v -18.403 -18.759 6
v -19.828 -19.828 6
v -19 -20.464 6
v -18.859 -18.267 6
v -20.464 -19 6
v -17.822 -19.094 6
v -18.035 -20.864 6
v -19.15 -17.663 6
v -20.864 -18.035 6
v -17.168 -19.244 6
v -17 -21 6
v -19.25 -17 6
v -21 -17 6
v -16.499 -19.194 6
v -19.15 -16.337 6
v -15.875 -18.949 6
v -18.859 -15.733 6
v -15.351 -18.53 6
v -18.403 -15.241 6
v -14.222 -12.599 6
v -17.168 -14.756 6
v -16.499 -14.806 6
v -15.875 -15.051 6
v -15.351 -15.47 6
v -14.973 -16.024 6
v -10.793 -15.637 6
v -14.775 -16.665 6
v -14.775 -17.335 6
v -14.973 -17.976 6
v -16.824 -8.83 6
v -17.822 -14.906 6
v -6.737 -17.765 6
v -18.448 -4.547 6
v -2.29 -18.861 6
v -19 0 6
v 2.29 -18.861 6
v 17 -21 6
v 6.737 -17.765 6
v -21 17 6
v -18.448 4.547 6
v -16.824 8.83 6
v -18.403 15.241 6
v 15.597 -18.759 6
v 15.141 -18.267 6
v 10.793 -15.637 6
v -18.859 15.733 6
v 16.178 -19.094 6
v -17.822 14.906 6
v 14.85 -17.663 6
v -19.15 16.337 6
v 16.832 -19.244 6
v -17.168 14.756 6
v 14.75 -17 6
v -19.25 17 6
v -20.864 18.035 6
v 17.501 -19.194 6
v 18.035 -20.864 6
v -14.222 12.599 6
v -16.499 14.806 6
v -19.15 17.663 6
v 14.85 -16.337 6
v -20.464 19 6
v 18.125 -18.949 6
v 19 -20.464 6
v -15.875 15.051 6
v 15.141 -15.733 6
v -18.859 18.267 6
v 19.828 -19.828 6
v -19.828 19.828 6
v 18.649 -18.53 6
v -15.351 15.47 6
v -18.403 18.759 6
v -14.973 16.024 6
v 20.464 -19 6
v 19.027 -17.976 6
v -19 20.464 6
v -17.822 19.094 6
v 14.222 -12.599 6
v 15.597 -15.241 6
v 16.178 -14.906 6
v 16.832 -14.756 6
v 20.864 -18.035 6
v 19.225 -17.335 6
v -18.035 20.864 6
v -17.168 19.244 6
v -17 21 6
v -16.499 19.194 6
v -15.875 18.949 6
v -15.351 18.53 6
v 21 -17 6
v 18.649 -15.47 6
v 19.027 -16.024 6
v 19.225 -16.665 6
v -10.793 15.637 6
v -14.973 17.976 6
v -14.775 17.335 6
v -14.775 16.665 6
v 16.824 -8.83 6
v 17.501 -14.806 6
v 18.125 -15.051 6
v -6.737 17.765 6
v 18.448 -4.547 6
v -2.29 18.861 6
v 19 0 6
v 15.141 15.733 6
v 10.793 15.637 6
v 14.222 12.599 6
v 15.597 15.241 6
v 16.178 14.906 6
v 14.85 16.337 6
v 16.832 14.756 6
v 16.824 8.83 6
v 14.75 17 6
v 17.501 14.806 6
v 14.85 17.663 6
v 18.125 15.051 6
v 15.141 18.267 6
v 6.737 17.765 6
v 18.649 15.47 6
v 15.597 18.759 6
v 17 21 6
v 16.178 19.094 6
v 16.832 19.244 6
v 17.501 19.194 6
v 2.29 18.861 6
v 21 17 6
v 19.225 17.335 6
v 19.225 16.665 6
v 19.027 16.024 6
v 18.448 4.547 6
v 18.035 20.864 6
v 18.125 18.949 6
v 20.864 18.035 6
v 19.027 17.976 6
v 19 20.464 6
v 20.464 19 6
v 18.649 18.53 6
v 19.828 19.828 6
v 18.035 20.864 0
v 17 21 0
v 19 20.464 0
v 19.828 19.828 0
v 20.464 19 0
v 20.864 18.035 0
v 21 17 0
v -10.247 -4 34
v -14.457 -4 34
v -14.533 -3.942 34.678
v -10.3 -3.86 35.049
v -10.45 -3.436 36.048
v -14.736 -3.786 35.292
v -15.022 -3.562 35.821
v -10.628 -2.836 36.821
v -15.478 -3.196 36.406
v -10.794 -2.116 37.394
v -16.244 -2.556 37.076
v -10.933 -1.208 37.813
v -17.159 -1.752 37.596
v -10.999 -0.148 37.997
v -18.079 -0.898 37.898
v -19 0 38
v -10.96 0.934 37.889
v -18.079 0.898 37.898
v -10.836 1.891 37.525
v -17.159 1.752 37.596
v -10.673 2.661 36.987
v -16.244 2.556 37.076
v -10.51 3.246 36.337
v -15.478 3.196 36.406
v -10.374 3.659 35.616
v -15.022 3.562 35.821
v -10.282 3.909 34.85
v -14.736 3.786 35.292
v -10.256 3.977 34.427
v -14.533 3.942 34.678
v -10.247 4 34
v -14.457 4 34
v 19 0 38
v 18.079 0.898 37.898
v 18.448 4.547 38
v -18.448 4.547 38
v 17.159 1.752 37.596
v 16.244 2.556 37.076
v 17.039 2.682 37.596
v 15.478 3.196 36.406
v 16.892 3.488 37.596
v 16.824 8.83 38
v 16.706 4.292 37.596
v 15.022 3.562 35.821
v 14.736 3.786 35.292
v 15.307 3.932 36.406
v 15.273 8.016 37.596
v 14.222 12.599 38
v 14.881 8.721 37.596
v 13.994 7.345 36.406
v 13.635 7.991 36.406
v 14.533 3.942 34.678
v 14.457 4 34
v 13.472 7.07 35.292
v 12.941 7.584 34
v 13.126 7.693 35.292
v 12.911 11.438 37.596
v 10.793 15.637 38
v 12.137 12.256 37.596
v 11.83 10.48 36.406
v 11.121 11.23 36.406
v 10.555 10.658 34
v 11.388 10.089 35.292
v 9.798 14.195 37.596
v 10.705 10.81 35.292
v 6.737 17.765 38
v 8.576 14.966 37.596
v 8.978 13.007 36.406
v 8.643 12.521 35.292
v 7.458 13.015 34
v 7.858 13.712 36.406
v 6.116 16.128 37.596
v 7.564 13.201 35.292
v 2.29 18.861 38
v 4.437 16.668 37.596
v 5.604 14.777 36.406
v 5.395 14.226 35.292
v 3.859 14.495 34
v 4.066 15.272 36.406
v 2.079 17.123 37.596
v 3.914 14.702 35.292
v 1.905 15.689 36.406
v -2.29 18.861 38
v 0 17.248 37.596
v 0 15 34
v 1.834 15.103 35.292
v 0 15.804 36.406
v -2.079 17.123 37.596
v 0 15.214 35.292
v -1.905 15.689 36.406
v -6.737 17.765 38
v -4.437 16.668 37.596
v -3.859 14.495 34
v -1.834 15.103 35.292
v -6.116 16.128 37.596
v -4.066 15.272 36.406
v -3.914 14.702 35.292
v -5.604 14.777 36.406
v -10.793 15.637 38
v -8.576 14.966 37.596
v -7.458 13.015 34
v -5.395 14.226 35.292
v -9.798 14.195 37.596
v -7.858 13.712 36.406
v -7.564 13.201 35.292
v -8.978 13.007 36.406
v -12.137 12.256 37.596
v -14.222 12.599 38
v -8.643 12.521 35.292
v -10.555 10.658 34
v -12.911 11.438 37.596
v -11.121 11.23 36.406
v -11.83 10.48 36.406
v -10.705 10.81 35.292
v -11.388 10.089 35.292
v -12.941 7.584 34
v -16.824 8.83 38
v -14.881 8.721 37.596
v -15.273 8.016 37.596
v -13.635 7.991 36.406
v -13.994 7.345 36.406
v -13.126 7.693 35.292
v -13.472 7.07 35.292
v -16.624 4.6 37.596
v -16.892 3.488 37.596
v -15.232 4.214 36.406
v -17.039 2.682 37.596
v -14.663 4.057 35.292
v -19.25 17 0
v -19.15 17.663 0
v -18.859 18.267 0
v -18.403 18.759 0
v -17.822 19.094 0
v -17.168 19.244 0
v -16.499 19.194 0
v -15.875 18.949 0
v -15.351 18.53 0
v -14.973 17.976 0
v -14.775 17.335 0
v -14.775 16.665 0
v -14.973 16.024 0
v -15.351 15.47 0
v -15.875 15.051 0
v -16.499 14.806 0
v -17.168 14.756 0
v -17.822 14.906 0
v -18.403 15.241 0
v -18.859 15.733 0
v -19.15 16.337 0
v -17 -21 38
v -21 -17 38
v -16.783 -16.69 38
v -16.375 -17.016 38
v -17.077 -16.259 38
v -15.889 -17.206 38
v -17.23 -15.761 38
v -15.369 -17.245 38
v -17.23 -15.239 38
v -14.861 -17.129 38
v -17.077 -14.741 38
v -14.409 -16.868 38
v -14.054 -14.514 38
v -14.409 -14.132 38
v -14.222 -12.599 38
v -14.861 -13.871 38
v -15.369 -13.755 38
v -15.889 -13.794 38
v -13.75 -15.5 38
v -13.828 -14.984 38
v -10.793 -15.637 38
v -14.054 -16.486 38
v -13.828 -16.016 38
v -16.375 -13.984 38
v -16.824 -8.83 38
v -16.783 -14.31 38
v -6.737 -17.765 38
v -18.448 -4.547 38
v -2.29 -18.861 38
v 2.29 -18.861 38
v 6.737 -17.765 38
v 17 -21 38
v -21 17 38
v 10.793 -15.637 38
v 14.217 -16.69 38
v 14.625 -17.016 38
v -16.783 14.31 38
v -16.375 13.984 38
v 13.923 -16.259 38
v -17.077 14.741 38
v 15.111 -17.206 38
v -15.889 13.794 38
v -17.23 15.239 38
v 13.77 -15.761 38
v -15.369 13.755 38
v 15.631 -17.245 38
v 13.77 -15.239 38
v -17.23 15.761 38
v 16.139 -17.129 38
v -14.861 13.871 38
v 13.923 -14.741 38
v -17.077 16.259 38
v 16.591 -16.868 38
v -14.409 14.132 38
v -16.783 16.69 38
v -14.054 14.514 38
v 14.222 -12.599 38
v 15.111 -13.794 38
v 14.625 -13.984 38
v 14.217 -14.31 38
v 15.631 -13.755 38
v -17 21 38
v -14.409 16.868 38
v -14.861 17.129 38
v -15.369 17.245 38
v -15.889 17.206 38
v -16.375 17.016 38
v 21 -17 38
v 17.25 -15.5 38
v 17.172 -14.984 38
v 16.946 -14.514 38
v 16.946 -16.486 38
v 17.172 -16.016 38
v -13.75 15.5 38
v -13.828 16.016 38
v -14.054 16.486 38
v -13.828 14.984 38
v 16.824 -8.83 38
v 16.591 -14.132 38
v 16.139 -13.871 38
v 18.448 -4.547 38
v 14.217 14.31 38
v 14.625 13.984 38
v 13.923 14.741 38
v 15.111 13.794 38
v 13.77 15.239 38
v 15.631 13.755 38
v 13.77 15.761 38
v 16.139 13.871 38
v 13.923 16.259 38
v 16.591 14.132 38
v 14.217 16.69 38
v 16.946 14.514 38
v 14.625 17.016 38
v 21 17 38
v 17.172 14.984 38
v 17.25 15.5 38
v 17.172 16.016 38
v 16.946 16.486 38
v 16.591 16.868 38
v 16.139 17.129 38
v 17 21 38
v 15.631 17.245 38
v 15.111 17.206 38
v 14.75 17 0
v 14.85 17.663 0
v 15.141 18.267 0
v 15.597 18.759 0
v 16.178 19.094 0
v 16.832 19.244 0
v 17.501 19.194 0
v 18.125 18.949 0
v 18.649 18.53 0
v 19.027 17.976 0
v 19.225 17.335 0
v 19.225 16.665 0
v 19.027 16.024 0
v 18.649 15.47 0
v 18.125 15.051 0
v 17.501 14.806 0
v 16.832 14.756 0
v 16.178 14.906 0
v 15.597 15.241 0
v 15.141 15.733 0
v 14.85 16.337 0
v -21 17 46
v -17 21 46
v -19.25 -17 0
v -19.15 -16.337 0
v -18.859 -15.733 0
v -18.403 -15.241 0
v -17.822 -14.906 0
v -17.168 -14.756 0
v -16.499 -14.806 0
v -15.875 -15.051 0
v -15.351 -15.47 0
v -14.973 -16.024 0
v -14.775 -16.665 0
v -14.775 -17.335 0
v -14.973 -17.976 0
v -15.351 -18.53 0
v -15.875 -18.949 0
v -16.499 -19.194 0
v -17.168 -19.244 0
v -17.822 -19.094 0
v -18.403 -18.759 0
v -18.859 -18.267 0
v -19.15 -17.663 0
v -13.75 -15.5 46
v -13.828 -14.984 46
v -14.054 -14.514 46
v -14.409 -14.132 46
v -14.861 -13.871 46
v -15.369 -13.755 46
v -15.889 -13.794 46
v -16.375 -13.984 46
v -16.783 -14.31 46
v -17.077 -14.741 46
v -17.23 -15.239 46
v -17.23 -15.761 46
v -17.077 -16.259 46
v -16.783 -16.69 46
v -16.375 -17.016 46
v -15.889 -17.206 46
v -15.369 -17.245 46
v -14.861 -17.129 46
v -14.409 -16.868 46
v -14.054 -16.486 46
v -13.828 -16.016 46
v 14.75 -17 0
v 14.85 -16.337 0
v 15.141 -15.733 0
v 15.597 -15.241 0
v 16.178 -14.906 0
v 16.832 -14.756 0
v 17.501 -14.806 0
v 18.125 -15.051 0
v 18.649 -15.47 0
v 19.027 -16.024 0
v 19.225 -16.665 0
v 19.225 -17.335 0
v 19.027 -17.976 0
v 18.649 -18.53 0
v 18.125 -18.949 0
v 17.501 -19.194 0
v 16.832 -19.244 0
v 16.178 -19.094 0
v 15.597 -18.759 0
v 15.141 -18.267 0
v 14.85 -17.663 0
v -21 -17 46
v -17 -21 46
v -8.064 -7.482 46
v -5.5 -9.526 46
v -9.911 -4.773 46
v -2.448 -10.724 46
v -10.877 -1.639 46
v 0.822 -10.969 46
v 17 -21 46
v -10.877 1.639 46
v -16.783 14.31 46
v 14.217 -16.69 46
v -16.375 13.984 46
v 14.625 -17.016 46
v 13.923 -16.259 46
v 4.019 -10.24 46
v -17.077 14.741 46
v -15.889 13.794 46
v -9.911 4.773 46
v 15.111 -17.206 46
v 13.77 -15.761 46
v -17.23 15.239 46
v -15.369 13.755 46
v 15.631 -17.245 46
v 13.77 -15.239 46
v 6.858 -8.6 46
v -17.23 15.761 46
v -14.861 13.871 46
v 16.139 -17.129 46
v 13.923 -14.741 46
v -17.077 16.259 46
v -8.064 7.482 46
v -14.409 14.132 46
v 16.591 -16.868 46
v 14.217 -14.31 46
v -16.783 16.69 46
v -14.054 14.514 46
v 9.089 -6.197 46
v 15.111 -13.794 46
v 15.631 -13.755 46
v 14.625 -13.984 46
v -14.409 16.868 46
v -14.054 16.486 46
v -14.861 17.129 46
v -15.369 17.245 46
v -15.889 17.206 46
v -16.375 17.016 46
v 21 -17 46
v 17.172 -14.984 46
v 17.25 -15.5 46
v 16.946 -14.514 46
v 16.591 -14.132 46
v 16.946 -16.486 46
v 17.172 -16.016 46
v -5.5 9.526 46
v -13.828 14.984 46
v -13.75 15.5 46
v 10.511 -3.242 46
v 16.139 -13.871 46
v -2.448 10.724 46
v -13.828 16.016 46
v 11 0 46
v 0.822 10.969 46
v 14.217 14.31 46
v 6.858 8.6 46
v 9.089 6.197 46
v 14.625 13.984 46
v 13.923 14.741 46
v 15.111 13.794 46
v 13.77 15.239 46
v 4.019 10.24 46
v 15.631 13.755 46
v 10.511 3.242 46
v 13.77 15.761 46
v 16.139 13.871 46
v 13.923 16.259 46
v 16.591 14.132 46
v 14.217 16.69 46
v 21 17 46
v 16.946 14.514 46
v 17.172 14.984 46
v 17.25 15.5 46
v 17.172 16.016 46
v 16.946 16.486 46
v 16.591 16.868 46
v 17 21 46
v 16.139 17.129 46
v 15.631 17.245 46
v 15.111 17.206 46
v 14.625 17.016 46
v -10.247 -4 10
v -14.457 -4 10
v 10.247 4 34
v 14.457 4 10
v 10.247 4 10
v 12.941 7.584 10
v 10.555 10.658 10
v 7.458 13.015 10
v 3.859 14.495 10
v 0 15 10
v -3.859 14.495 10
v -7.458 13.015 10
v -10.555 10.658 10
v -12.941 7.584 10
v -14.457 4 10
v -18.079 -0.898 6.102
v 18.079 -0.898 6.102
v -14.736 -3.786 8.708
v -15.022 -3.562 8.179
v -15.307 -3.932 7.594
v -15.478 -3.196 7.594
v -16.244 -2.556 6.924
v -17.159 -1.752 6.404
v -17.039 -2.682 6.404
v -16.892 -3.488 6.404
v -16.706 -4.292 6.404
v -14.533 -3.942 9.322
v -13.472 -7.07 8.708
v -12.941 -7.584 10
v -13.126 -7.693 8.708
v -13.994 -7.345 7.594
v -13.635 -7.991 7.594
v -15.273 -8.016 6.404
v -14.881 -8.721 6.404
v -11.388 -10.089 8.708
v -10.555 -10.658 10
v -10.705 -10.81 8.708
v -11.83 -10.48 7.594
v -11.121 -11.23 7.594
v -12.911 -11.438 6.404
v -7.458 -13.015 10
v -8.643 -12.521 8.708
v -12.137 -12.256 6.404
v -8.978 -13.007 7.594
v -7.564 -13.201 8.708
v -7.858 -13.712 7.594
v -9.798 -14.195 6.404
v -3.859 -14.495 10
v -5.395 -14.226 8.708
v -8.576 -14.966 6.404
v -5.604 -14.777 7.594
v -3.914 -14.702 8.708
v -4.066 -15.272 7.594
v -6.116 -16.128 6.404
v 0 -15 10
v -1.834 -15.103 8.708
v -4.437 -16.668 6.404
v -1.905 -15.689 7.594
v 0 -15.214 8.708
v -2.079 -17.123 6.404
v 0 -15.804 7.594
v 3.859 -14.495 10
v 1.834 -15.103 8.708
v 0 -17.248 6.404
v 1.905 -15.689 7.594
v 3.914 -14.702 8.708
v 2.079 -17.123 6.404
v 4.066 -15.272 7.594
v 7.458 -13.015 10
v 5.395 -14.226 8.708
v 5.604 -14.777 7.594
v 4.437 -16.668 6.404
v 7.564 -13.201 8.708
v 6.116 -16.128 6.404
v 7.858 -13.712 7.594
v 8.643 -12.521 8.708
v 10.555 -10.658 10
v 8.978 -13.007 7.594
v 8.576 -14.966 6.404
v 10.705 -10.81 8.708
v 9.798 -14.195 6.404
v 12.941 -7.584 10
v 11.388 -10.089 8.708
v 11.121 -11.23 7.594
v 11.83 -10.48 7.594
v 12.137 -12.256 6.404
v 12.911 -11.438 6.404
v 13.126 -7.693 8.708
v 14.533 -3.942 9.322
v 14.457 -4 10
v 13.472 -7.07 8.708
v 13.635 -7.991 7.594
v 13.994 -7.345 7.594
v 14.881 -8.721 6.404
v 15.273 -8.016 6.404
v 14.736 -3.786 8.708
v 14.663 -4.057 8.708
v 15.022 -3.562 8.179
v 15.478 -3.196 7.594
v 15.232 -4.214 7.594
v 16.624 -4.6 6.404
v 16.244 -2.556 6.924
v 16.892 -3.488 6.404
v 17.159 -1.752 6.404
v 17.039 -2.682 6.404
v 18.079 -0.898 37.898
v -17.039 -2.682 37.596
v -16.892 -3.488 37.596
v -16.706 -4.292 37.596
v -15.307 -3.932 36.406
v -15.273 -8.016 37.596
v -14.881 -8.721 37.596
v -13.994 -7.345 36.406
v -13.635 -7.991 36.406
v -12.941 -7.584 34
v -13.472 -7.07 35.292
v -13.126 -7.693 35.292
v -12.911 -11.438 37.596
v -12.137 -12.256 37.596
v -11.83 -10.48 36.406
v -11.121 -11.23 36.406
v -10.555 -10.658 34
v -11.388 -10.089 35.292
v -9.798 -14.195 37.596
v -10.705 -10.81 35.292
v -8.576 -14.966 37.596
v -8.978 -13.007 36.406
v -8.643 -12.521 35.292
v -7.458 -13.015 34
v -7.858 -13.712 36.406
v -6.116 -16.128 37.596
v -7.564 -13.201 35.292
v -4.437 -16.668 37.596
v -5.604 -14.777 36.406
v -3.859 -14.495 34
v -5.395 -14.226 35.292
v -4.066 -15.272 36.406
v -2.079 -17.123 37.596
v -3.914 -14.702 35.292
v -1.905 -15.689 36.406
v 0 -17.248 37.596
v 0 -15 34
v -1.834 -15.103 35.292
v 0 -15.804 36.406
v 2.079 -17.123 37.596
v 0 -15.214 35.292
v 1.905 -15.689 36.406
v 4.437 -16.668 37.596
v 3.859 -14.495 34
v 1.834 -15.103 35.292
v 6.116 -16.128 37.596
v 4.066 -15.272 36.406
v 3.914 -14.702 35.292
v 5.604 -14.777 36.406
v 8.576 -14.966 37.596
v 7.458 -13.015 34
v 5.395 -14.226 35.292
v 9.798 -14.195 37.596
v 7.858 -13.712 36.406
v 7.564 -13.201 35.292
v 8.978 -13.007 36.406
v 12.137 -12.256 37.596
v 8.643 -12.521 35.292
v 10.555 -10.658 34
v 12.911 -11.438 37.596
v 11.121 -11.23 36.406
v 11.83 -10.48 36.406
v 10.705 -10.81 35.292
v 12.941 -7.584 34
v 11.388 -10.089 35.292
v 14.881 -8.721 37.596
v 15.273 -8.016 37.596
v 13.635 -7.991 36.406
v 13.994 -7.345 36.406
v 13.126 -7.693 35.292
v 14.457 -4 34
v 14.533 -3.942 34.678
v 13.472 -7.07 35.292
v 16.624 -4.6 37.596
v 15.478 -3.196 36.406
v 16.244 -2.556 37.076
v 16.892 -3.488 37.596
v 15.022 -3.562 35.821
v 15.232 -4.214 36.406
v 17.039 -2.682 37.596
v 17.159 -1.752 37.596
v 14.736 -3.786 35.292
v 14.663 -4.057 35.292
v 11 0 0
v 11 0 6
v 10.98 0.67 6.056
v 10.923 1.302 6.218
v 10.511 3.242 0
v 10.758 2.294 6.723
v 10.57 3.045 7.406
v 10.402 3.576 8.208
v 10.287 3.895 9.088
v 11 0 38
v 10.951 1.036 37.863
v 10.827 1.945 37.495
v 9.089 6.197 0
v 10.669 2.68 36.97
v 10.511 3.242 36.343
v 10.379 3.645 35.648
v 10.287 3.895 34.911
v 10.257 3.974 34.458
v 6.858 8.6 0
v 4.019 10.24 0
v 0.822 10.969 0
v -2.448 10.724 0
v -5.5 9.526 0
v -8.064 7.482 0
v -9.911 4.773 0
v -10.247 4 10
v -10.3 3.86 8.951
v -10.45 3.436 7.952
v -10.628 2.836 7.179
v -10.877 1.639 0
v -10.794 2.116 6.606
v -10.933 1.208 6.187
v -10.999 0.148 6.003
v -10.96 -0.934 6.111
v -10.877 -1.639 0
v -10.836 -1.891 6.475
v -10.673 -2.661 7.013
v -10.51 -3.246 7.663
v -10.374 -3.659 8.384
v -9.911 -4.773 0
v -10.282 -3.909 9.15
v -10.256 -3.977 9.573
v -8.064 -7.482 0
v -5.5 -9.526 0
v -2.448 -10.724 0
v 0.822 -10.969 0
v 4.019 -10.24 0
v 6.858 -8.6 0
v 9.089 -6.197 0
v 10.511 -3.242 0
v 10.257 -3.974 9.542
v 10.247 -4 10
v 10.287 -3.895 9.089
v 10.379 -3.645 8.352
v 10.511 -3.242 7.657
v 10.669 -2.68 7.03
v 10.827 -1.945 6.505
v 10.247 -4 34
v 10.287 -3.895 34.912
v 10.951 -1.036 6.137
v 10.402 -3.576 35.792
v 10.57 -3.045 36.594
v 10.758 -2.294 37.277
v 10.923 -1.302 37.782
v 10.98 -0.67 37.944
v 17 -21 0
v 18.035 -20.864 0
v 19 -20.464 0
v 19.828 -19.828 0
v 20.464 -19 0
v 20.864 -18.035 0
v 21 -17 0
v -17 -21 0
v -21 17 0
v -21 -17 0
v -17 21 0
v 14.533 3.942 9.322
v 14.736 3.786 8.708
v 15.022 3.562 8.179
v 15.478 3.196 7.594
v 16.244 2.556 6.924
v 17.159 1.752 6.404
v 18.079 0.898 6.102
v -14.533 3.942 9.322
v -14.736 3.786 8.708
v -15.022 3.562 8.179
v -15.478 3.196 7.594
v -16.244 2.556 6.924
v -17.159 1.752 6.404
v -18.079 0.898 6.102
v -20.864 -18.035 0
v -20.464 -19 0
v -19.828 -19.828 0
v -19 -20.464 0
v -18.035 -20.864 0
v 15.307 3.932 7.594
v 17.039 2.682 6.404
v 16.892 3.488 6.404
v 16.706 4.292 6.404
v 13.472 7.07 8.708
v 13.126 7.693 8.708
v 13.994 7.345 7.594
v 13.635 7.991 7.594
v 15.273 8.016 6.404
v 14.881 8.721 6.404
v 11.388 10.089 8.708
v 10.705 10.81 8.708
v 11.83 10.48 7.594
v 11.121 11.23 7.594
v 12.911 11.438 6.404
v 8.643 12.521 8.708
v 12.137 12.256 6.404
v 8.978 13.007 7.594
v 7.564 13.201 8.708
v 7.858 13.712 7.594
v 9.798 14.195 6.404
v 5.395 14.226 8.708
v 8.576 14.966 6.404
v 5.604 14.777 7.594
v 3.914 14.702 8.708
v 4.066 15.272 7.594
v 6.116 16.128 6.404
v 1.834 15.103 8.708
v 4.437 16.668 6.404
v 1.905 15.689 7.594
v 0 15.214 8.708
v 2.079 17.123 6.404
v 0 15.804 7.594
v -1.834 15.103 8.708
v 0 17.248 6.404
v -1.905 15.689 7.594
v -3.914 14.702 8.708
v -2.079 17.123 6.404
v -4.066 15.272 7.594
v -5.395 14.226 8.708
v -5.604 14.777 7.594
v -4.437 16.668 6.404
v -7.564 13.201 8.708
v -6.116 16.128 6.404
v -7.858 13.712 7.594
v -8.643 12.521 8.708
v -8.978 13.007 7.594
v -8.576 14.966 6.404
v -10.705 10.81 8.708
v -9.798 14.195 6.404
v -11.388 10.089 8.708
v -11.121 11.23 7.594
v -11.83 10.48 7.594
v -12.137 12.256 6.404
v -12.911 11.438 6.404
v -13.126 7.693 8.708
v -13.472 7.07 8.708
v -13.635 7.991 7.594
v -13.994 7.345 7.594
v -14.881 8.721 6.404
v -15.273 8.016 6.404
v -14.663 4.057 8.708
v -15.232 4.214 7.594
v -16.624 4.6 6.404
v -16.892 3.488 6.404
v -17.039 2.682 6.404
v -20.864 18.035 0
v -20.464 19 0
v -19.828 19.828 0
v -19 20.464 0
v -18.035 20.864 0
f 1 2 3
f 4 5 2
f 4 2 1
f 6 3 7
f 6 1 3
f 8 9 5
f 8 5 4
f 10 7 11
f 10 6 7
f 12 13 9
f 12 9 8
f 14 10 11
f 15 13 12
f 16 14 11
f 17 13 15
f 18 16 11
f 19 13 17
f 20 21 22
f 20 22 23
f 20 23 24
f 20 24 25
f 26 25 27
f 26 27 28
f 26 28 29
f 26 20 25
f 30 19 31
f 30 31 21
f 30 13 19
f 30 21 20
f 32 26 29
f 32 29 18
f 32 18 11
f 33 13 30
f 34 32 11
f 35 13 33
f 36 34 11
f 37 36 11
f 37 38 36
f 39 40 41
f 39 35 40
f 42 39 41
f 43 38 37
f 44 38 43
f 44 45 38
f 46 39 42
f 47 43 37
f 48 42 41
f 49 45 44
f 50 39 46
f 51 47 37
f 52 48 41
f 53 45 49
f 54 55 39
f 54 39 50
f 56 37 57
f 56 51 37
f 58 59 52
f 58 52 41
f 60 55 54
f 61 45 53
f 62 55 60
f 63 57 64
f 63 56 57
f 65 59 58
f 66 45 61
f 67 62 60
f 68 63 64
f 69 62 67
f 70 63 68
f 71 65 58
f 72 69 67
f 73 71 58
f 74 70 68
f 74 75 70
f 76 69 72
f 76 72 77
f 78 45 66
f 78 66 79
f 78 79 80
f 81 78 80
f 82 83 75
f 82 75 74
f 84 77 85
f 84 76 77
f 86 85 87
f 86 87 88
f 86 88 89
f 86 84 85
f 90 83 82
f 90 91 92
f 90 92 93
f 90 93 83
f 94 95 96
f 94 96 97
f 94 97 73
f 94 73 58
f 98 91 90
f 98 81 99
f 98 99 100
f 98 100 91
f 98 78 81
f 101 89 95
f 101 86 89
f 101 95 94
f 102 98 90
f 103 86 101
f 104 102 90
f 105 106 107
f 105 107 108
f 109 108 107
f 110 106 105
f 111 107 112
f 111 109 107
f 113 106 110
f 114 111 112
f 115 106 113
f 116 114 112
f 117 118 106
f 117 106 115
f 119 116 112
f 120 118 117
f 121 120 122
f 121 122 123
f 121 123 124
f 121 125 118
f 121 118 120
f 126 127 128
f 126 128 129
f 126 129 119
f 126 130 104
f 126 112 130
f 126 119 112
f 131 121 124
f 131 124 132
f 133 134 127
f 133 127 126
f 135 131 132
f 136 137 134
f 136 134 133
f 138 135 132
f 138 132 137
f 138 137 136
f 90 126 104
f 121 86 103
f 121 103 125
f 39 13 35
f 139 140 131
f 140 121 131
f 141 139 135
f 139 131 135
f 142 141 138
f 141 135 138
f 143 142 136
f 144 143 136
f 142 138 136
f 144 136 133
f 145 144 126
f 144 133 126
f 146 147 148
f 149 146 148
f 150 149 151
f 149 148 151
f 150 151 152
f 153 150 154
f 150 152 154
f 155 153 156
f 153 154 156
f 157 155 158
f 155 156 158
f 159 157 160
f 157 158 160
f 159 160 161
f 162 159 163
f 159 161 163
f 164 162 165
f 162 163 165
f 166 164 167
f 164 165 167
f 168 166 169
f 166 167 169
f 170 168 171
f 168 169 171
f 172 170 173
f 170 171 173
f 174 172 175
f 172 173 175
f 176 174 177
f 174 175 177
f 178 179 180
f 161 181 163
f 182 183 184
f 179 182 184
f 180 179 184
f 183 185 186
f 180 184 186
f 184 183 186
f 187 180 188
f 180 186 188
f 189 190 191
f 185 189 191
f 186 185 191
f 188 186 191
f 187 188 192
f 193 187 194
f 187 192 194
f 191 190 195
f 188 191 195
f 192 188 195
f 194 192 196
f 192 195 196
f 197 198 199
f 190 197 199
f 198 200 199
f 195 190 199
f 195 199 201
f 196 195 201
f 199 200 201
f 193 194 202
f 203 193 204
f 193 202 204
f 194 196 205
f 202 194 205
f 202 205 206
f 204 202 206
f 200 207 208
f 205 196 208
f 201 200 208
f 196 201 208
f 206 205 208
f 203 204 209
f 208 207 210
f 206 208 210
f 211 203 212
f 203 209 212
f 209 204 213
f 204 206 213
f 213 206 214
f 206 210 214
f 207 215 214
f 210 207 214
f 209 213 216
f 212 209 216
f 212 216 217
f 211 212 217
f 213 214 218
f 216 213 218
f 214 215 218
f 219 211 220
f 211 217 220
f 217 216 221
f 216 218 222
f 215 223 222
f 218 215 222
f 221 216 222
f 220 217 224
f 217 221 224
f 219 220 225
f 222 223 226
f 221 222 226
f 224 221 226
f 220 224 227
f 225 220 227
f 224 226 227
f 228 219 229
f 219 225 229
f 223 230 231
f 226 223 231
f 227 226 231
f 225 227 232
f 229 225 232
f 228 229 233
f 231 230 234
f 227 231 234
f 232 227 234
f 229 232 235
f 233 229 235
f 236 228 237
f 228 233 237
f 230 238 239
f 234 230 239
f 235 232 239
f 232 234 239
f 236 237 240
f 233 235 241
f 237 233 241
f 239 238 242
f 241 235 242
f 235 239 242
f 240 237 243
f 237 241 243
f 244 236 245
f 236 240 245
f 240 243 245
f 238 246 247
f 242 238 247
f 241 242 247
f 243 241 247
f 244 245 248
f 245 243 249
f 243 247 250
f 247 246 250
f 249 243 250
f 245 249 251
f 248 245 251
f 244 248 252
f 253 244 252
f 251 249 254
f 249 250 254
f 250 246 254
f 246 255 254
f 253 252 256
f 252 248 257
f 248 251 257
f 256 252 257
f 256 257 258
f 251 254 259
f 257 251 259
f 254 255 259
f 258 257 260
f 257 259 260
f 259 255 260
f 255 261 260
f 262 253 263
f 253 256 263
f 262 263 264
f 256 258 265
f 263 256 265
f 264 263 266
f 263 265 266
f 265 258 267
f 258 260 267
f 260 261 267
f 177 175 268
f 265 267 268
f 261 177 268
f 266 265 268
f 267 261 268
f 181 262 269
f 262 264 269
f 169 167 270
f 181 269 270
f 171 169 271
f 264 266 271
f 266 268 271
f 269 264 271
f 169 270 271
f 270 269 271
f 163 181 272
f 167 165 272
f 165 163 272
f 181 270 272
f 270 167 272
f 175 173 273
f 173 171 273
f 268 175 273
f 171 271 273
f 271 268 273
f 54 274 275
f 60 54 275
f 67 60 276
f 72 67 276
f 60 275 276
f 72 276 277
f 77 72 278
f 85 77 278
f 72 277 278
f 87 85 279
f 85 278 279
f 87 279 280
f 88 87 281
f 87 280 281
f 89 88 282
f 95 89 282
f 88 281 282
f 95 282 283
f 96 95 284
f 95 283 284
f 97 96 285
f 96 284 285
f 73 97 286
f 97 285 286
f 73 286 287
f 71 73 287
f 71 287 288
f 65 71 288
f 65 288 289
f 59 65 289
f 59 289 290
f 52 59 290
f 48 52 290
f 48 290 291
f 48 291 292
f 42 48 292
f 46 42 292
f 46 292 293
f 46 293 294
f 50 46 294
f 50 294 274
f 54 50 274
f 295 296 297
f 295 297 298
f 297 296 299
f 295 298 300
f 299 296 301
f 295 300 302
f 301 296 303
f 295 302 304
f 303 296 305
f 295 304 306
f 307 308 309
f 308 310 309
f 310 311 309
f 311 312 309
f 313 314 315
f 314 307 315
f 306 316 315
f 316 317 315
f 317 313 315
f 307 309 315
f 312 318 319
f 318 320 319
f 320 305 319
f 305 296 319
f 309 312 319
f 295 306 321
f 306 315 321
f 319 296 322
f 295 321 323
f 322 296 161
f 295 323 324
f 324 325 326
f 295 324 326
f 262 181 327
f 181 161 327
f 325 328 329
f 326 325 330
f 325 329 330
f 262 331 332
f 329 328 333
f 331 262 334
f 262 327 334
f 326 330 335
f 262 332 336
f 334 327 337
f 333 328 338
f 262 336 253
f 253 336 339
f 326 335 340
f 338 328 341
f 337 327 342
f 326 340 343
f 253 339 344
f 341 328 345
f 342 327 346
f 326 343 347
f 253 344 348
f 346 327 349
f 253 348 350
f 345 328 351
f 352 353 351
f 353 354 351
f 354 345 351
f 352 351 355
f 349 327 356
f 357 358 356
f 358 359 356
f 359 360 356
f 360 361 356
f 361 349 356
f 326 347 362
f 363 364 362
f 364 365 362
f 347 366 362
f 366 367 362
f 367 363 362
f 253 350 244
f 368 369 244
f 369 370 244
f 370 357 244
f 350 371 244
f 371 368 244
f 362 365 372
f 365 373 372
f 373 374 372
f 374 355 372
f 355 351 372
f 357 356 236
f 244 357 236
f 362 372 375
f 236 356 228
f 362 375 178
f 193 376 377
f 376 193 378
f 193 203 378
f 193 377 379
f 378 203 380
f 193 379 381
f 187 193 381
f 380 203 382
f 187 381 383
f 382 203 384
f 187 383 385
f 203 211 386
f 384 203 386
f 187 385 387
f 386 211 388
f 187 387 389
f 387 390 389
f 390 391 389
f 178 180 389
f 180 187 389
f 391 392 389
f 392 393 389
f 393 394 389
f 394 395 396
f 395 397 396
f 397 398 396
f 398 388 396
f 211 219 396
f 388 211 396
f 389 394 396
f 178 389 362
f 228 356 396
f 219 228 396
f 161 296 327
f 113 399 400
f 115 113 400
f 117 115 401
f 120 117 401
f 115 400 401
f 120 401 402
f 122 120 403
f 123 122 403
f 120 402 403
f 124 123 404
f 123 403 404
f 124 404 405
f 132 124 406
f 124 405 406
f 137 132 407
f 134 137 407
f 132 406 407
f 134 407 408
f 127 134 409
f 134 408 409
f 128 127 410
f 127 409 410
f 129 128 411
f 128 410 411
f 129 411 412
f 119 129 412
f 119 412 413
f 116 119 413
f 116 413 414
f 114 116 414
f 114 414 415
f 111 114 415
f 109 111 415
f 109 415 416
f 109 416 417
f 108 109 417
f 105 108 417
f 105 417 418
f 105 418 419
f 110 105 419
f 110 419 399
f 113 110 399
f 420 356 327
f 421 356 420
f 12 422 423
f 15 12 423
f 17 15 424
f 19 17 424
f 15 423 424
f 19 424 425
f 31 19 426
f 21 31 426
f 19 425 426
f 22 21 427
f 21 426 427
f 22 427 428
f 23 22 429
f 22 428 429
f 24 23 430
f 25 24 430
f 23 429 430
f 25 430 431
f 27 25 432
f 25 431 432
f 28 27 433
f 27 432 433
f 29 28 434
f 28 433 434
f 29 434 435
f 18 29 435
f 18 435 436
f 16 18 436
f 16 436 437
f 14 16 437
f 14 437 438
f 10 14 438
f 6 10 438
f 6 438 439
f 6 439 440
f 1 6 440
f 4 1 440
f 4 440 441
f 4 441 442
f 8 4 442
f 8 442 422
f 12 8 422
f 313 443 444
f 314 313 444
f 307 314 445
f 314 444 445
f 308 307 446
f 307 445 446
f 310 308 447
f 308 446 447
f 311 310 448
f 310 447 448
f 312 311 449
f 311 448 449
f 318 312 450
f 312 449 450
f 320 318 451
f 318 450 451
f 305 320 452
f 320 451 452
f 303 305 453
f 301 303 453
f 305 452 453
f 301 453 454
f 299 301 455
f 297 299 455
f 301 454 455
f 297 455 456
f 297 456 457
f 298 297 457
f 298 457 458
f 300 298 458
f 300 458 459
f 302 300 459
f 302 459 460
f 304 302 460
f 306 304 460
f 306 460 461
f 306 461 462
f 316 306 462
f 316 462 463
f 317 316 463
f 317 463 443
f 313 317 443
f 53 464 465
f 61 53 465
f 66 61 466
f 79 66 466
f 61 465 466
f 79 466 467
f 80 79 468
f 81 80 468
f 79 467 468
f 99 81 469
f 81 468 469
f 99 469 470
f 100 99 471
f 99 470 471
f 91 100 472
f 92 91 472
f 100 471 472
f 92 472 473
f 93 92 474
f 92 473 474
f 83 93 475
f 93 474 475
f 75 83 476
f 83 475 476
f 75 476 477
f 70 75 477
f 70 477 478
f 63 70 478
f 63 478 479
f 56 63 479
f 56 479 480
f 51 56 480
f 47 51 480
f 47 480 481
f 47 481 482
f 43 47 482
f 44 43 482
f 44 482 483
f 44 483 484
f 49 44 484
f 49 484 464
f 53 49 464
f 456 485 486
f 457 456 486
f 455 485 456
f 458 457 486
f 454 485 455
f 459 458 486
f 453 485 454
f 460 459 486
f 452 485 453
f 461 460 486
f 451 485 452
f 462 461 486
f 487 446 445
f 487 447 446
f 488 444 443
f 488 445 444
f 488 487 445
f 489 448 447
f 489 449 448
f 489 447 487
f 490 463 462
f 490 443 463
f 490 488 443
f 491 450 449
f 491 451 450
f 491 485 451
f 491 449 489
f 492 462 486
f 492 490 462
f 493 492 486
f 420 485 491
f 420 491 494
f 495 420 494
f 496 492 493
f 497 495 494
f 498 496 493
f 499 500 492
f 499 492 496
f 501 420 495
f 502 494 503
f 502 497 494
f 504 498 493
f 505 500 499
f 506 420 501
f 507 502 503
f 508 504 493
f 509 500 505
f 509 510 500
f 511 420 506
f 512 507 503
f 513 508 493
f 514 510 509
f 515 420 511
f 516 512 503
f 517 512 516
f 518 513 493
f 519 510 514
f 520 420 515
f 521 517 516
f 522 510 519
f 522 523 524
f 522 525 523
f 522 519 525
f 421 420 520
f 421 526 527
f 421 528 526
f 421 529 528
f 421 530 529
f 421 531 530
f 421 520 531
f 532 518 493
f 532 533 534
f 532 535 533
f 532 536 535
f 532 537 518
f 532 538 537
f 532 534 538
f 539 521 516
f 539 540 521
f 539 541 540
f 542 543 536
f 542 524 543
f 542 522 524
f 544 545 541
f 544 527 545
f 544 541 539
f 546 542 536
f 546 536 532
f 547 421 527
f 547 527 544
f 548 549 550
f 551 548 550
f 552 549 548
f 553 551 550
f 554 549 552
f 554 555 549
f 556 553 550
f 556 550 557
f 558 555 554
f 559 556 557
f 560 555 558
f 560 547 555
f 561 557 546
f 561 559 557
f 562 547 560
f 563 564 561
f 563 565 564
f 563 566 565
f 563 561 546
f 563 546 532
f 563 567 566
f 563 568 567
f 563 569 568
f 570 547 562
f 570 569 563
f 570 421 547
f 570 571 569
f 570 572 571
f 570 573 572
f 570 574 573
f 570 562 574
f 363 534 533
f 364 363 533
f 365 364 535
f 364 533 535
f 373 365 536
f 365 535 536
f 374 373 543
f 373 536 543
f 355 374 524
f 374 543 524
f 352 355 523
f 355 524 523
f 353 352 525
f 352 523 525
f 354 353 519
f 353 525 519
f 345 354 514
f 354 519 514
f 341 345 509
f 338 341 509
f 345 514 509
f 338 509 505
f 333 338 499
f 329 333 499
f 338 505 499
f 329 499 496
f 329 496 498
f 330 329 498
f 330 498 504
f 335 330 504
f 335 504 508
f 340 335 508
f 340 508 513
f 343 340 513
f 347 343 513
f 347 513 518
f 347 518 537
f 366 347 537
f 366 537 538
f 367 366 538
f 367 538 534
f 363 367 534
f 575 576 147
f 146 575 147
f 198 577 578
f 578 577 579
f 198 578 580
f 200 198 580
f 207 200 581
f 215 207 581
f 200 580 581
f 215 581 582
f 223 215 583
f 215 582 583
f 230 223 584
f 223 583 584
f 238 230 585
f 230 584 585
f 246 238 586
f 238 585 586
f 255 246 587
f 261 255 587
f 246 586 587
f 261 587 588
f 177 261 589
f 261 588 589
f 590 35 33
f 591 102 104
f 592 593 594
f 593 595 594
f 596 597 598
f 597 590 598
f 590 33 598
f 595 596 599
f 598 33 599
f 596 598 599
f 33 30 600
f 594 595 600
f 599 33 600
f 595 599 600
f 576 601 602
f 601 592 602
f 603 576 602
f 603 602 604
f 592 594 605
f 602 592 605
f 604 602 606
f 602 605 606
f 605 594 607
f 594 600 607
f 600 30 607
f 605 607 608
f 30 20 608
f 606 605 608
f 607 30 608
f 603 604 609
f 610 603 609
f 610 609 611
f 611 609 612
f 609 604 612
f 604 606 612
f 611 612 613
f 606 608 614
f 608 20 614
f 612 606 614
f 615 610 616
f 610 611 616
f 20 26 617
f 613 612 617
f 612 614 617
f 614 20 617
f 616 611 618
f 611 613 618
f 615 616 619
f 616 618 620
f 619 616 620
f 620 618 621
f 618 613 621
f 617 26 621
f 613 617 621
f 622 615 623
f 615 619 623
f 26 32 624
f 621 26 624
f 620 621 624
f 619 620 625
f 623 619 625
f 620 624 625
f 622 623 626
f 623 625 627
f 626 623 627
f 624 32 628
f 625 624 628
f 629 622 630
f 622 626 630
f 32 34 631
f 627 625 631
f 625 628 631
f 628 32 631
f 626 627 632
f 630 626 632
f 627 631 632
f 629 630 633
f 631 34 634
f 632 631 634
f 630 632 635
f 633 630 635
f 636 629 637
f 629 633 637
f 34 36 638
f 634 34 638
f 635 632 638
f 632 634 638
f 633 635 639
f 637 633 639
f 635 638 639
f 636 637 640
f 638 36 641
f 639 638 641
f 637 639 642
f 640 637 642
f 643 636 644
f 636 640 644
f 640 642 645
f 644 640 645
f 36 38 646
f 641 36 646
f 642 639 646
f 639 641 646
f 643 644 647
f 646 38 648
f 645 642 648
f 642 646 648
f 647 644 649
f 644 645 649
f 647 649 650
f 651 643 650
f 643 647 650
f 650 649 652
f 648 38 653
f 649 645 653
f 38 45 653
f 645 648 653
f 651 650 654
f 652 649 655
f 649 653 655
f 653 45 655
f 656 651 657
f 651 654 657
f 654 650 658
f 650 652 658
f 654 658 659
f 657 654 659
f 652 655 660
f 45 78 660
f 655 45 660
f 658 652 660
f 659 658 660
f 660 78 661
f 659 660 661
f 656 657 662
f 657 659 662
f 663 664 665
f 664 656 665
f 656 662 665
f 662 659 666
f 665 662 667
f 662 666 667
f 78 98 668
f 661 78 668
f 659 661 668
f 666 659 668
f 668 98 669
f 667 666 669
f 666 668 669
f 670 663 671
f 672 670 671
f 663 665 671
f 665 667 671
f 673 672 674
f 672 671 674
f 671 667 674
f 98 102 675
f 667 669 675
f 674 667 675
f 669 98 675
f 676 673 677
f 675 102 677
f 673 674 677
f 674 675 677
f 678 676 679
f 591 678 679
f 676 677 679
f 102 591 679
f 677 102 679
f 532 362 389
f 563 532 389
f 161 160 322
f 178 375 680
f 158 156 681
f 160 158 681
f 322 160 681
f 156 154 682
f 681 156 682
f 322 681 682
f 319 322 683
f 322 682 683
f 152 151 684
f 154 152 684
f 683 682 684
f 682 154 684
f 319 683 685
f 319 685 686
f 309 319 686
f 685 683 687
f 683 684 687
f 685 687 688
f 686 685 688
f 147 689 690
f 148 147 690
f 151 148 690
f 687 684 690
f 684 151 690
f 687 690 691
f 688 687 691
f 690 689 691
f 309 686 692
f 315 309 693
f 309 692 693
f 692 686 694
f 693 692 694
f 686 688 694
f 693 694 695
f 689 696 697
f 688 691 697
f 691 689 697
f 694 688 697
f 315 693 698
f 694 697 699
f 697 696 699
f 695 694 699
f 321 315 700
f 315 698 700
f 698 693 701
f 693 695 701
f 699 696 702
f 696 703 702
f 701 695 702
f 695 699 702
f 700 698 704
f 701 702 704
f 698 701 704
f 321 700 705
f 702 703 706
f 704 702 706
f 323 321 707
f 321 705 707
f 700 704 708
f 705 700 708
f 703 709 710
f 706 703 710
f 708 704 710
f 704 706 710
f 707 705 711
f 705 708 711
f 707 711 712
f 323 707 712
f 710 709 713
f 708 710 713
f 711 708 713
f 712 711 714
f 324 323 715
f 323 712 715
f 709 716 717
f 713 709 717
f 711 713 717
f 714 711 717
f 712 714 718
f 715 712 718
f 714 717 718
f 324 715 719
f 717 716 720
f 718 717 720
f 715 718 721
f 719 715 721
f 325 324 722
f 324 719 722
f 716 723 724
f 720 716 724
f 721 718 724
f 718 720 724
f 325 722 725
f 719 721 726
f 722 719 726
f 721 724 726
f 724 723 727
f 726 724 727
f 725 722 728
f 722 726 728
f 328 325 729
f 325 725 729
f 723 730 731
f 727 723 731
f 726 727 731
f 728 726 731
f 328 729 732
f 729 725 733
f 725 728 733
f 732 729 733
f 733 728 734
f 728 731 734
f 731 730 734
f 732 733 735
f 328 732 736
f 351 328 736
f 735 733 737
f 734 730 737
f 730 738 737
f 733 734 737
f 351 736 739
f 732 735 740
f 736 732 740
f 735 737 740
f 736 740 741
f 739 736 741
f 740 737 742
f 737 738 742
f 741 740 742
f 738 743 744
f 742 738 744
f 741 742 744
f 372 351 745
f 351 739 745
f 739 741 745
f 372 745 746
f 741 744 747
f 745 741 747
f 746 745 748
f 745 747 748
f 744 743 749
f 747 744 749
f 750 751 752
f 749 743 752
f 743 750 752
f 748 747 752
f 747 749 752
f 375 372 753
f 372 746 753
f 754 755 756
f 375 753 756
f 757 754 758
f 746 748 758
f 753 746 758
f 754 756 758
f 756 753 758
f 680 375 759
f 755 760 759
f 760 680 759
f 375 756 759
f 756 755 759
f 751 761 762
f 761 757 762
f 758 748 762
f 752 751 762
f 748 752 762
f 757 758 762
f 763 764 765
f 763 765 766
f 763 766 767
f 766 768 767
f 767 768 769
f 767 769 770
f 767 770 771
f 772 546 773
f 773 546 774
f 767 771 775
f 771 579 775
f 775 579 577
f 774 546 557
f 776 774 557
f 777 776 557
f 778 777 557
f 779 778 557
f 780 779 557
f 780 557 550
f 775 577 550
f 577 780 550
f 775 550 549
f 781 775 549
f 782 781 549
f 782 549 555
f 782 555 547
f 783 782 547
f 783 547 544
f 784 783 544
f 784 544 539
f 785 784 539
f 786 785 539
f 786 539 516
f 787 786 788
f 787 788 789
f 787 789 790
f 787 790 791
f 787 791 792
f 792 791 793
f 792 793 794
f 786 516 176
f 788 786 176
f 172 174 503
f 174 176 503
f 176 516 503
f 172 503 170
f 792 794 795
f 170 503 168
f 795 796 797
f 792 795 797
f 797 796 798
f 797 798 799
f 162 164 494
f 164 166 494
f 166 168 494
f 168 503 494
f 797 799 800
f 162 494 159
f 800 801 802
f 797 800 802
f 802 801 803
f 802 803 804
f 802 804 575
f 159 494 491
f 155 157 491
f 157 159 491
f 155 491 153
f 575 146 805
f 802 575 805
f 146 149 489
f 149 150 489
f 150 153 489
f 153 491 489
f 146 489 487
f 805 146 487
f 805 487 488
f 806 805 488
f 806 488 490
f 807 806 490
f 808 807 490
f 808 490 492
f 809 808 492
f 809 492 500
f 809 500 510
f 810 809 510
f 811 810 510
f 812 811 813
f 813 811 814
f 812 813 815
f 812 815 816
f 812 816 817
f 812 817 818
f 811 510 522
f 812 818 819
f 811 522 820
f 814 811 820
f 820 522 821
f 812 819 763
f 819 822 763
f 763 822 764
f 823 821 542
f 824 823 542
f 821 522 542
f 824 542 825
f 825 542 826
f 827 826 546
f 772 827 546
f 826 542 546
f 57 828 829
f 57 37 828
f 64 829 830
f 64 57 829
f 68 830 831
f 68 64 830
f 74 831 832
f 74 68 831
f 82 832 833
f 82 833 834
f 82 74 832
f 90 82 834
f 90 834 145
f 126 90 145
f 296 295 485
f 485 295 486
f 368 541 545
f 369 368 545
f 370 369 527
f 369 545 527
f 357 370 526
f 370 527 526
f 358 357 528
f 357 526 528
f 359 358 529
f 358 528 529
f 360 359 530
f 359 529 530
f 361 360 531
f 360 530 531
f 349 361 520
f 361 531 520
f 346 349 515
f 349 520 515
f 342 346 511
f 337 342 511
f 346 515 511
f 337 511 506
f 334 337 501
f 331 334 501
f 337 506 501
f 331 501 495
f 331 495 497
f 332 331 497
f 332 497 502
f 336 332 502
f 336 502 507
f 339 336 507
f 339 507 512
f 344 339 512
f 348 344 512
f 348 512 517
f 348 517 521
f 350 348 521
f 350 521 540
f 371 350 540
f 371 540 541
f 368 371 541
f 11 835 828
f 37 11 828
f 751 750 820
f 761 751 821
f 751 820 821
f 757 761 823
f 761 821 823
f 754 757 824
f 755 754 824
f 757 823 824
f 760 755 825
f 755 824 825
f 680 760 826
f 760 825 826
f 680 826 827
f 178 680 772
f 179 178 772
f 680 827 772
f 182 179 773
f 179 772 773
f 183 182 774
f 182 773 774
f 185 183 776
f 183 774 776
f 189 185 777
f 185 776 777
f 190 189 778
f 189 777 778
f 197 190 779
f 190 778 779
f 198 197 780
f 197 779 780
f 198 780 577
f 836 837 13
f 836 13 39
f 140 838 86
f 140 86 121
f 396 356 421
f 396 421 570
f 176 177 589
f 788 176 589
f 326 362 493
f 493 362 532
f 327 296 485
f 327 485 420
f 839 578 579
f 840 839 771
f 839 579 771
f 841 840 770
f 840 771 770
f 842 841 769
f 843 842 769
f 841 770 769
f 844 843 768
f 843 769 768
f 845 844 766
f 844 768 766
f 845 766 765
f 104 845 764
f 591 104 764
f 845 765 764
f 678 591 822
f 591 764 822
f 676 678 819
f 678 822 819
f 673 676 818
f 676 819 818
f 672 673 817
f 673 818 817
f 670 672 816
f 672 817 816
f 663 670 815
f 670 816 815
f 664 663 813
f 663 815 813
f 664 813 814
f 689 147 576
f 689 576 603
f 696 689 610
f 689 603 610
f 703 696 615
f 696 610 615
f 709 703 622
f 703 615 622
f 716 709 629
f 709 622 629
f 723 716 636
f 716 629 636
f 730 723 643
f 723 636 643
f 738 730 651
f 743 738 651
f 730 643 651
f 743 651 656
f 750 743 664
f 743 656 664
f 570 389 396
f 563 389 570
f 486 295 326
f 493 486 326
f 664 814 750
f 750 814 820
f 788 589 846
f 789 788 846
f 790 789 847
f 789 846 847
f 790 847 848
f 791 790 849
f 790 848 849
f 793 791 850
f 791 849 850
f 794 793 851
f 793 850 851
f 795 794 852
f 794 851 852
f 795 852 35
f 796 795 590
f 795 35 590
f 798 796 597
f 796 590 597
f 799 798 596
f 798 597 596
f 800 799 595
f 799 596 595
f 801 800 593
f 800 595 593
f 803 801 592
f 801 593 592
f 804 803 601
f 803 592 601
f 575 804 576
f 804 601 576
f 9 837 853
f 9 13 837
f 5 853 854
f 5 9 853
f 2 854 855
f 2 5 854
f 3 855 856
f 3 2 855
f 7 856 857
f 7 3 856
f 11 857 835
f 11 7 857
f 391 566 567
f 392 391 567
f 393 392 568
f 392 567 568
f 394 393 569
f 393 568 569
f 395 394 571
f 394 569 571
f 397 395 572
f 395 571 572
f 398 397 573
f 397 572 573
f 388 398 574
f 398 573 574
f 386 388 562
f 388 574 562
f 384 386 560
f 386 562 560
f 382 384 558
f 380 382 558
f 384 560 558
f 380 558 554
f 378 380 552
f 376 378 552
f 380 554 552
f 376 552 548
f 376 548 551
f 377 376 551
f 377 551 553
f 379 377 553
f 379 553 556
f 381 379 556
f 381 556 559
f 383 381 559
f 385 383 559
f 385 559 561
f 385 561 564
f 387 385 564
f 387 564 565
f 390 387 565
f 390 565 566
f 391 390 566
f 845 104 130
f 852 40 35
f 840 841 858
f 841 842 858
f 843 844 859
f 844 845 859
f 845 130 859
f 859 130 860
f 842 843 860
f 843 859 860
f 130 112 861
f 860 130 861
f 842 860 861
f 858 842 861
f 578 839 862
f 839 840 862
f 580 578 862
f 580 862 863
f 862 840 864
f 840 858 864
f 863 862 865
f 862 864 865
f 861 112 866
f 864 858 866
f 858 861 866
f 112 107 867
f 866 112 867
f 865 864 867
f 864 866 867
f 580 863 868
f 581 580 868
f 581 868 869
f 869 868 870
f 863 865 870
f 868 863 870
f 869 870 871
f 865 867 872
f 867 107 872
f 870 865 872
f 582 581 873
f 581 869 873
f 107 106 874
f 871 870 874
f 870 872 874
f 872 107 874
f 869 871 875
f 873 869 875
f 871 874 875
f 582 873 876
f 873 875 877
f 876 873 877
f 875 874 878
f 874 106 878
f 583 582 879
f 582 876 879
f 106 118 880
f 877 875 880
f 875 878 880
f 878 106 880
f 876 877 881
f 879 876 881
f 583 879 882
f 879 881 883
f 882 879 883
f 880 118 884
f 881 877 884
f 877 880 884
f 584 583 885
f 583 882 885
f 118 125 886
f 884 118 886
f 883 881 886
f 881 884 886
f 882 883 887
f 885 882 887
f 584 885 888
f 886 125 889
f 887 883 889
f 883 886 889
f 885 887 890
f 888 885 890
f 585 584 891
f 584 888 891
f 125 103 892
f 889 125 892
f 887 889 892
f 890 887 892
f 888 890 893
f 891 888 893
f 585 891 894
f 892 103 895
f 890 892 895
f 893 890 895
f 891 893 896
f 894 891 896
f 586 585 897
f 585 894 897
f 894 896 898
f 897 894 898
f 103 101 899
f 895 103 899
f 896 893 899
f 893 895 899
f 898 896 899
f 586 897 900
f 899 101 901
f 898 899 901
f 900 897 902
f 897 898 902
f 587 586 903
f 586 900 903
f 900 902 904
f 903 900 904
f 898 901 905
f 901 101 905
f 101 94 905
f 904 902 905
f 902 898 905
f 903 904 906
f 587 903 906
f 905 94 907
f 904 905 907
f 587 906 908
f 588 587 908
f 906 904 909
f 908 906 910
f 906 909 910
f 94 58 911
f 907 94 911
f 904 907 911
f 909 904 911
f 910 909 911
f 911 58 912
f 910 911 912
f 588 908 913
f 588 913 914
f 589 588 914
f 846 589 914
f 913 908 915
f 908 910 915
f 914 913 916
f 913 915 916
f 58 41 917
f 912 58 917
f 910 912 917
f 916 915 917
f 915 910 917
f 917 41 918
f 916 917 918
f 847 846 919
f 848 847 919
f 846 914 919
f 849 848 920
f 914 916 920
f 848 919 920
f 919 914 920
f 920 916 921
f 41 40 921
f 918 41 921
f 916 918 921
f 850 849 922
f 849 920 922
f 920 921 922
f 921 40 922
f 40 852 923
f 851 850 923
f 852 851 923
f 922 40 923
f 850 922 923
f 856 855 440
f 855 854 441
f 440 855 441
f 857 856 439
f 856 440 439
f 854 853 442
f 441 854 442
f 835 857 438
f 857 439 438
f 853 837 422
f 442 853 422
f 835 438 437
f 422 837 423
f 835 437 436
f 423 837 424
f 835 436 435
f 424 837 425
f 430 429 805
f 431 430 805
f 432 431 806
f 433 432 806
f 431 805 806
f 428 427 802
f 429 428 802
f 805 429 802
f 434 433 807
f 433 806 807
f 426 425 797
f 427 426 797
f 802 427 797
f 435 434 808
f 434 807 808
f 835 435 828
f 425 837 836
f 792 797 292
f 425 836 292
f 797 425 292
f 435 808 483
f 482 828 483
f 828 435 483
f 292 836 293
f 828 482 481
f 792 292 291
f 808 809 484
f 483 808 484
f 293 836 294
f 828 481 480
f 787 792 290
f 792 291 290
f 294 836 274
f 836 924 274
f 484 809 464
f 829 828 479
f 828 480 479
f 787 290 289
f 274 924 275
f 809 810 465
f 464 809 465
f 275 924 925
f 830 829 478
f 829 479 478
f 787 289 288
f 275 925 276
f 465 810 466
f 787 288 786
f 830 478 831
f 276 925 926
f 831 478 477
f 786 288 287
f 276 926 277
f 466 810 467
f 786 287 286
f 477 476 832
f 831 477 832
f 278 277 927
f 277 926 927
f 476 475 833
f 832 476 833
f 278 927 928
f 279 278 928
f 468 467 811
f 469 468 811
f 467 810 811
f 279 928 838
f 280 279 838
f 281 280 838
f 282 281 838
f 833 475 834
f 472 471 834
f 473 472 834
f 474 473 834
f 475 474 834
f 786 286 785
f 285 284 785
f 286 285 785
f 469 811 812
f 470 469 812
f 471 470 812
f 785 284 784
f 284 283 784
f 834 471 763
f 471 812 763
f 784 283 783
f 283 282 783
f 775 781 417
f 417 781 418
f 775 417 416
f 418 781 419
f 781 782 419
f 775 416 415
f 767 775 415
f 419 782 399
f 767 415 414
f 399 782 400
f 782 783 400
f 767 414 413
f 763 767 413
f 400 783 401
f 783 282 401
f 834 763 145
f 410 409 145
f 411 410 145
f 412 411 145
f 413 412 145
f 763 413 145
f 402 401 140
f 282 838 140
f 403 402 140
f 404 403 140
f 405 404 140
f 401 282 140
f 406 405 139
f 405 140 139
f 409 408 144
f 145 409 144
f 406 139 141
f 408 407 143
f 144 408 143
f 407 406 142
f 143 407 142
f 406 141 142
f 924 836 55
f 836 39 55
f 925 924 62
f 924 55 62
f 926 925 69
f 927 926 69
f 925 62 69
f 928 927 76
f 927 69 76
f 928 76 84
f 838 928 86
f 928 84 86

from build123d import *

# Parameters (mm, degrees)
CROQUIS1_W                 = 42
CROQUIS1_H                 = 42
SALIENTE_EXTRUIR1_DEPTH    = 6
CROQUIS2_R                 = 15
SALIENTE_EXTRUIR2_DEPTH    = 32
CROQUIS3_W                 = 42
CROQUIS3_H                 = 42
SALIENTE_EXTRUIR3_DEPTH    = 8
CROQUIS4_R                 = 11
CORTAR_EXTRUIR1_DEPTH      = 55.753995288
CROQUIS5_R                 = 1.75
CORTAR_EXTRUIR2_DEPTH      = 10
CHAFL_N1_SIZE              = 4
REDONDEO1_R                = 4
CROQUIS6_R                 = 2.25
CORTAR_EXTRUIR3_DEPTH      = 10
REDONDEO2_R                = 4
CORTAR_EXTRUIR4_DEPTH      = 55.753995288
CORTAR_EXTRUIR4_DEPTH_BACK = 55.753995288


with BuildPart() as part:
    # Croquis1 → Saliente-Extruir1 (new body)
    with BuildSketch(Plane.XY):
        Rectangle(CROQUIS1_W, CROQUIS1_H)
    extrude(amount=SALIENTE_EXTRUIR1_DEPTH)

    # Croquis2 → Saliente-Extruir2 (add)
    with BuildSketch(Plane.XY.offset(6)):
        Circle(CROQUIS2_R)
    extrude(amount=SALIENTE_EXTRUIR2_DEPTH)

    # Croquis3 → Saliente-Extruir3 (add)
    with BuildSketch(Plane.XY.offset(38)):
        Rectangle(CROQUIS3_W, CROQUIS3_H)
    extrude(amount=SALIENTE_EXTRUIR3_DEPTH)

    # Croquis4 → Cortar-Extruir1 (cut, through all)
    with BuildSketch(Plane.XY.offset(46)):
        Circle(CROQUIS4_R)
    extrude(amount=-CORTAR_EXTRUIR1_DEPTH, mode=Mode.SUBTRACT)

    # Croquis5 → Cortar-Extruir2 (cut)
    with BuildSketch(Plane.XY.offset(46)):
        with Locations((15.5, 15.5)):
            Circle(CROQUIS5_R)
        with Locations((-15.5, 15.5)):
            Circle(CROQUIS5_R)
        with Locations((-15.5, -15.5)):
            Circle(CROQUIS5_R)
        with Locations((15.5, -15.5)):
            Circle(CROQUIS5_R)
    extrude(amount=-CORTAR_EXTRUIR2_DEPTH, mode=Mode.SUBTRACT)

    # Chaflán1
    chafl_n1_edges = [part.edges().sort_by_distance(p)[0] for p in [
        (21, -21, 42),
        (21, 21, 42),
        (-21, 21, 42),
        (-21, -21, 42),
    ]]
    chamfer(chafl_n1_edges, length=CHAFL_N1_SIZE)

    # Redondeo1
    redondeo1_edges = [part.edges().sort_by_distance(p)[0] for p in [
        (-15, 0, 6),
        (-15, 0, 38),
    ]]
    fillet(redondeo1_edges, radius=REDONDEO1_R)

    # Croquis6 → Cortar-Extruir3 (cut)
    with BuildSketch(Plane(origin=(0, 0, 0), x_dir=(-1, 0, 0), z_dir=(0, 0, -1))):
        with Locations((17, 17)):
            Circle(CROQUIS6_R)
        with Locations((17, -17)):
            Circle(CROQUIS6_R)
        with Locations((-17, -17)):
            Circle(CROQUIS6_R)
        with Locations((-17, 17)):
            Circle(CROQUIS6_R)
    extrude(amount=-CORTAR_EXTRUIR3_DEPTH, mode=Mode.SUBTRACT)

    # Redondeo2
    redondeo2_edges = [part.edges().sort_by_distance(p)[0] for p in [
        (21, -21, 3),
        (-21, -21, 3),
        (-21, 21, 3),
        (21, 21, 3),
    ]]
    fillet(redondeo2_edges, radius=REDONDEO2_R)

    # Croquis7 → Cortar-Extruir4 (cut, two sides: drawn at the far end of the back side and taken through both)
    with BuildSketch(Plane(origin=(0, 0, 0), x_dir=(0, 0, -1), z_dir=(1, 0, 0)).offset(-CORTAR_EXTRUIR4_DEPTH_BACK)):
        with BuildLine():
            Line((-34, 4), (-10, 4))
            ThreePointArc((-10, 4), (-6, 0), (-10, -4))
            Line((-10, -4), (-34, -4))
            ThreePointArc((-34, -4), (-38, 0), (-34, 4))
        make_face()
    extrude(amount=CORTAR_EXTRUIR4_DEPTH + CORTAR_EXTRUIR4_DEPTH_BACK, mode=Mode.SUBTRACT)


solid = part.part
